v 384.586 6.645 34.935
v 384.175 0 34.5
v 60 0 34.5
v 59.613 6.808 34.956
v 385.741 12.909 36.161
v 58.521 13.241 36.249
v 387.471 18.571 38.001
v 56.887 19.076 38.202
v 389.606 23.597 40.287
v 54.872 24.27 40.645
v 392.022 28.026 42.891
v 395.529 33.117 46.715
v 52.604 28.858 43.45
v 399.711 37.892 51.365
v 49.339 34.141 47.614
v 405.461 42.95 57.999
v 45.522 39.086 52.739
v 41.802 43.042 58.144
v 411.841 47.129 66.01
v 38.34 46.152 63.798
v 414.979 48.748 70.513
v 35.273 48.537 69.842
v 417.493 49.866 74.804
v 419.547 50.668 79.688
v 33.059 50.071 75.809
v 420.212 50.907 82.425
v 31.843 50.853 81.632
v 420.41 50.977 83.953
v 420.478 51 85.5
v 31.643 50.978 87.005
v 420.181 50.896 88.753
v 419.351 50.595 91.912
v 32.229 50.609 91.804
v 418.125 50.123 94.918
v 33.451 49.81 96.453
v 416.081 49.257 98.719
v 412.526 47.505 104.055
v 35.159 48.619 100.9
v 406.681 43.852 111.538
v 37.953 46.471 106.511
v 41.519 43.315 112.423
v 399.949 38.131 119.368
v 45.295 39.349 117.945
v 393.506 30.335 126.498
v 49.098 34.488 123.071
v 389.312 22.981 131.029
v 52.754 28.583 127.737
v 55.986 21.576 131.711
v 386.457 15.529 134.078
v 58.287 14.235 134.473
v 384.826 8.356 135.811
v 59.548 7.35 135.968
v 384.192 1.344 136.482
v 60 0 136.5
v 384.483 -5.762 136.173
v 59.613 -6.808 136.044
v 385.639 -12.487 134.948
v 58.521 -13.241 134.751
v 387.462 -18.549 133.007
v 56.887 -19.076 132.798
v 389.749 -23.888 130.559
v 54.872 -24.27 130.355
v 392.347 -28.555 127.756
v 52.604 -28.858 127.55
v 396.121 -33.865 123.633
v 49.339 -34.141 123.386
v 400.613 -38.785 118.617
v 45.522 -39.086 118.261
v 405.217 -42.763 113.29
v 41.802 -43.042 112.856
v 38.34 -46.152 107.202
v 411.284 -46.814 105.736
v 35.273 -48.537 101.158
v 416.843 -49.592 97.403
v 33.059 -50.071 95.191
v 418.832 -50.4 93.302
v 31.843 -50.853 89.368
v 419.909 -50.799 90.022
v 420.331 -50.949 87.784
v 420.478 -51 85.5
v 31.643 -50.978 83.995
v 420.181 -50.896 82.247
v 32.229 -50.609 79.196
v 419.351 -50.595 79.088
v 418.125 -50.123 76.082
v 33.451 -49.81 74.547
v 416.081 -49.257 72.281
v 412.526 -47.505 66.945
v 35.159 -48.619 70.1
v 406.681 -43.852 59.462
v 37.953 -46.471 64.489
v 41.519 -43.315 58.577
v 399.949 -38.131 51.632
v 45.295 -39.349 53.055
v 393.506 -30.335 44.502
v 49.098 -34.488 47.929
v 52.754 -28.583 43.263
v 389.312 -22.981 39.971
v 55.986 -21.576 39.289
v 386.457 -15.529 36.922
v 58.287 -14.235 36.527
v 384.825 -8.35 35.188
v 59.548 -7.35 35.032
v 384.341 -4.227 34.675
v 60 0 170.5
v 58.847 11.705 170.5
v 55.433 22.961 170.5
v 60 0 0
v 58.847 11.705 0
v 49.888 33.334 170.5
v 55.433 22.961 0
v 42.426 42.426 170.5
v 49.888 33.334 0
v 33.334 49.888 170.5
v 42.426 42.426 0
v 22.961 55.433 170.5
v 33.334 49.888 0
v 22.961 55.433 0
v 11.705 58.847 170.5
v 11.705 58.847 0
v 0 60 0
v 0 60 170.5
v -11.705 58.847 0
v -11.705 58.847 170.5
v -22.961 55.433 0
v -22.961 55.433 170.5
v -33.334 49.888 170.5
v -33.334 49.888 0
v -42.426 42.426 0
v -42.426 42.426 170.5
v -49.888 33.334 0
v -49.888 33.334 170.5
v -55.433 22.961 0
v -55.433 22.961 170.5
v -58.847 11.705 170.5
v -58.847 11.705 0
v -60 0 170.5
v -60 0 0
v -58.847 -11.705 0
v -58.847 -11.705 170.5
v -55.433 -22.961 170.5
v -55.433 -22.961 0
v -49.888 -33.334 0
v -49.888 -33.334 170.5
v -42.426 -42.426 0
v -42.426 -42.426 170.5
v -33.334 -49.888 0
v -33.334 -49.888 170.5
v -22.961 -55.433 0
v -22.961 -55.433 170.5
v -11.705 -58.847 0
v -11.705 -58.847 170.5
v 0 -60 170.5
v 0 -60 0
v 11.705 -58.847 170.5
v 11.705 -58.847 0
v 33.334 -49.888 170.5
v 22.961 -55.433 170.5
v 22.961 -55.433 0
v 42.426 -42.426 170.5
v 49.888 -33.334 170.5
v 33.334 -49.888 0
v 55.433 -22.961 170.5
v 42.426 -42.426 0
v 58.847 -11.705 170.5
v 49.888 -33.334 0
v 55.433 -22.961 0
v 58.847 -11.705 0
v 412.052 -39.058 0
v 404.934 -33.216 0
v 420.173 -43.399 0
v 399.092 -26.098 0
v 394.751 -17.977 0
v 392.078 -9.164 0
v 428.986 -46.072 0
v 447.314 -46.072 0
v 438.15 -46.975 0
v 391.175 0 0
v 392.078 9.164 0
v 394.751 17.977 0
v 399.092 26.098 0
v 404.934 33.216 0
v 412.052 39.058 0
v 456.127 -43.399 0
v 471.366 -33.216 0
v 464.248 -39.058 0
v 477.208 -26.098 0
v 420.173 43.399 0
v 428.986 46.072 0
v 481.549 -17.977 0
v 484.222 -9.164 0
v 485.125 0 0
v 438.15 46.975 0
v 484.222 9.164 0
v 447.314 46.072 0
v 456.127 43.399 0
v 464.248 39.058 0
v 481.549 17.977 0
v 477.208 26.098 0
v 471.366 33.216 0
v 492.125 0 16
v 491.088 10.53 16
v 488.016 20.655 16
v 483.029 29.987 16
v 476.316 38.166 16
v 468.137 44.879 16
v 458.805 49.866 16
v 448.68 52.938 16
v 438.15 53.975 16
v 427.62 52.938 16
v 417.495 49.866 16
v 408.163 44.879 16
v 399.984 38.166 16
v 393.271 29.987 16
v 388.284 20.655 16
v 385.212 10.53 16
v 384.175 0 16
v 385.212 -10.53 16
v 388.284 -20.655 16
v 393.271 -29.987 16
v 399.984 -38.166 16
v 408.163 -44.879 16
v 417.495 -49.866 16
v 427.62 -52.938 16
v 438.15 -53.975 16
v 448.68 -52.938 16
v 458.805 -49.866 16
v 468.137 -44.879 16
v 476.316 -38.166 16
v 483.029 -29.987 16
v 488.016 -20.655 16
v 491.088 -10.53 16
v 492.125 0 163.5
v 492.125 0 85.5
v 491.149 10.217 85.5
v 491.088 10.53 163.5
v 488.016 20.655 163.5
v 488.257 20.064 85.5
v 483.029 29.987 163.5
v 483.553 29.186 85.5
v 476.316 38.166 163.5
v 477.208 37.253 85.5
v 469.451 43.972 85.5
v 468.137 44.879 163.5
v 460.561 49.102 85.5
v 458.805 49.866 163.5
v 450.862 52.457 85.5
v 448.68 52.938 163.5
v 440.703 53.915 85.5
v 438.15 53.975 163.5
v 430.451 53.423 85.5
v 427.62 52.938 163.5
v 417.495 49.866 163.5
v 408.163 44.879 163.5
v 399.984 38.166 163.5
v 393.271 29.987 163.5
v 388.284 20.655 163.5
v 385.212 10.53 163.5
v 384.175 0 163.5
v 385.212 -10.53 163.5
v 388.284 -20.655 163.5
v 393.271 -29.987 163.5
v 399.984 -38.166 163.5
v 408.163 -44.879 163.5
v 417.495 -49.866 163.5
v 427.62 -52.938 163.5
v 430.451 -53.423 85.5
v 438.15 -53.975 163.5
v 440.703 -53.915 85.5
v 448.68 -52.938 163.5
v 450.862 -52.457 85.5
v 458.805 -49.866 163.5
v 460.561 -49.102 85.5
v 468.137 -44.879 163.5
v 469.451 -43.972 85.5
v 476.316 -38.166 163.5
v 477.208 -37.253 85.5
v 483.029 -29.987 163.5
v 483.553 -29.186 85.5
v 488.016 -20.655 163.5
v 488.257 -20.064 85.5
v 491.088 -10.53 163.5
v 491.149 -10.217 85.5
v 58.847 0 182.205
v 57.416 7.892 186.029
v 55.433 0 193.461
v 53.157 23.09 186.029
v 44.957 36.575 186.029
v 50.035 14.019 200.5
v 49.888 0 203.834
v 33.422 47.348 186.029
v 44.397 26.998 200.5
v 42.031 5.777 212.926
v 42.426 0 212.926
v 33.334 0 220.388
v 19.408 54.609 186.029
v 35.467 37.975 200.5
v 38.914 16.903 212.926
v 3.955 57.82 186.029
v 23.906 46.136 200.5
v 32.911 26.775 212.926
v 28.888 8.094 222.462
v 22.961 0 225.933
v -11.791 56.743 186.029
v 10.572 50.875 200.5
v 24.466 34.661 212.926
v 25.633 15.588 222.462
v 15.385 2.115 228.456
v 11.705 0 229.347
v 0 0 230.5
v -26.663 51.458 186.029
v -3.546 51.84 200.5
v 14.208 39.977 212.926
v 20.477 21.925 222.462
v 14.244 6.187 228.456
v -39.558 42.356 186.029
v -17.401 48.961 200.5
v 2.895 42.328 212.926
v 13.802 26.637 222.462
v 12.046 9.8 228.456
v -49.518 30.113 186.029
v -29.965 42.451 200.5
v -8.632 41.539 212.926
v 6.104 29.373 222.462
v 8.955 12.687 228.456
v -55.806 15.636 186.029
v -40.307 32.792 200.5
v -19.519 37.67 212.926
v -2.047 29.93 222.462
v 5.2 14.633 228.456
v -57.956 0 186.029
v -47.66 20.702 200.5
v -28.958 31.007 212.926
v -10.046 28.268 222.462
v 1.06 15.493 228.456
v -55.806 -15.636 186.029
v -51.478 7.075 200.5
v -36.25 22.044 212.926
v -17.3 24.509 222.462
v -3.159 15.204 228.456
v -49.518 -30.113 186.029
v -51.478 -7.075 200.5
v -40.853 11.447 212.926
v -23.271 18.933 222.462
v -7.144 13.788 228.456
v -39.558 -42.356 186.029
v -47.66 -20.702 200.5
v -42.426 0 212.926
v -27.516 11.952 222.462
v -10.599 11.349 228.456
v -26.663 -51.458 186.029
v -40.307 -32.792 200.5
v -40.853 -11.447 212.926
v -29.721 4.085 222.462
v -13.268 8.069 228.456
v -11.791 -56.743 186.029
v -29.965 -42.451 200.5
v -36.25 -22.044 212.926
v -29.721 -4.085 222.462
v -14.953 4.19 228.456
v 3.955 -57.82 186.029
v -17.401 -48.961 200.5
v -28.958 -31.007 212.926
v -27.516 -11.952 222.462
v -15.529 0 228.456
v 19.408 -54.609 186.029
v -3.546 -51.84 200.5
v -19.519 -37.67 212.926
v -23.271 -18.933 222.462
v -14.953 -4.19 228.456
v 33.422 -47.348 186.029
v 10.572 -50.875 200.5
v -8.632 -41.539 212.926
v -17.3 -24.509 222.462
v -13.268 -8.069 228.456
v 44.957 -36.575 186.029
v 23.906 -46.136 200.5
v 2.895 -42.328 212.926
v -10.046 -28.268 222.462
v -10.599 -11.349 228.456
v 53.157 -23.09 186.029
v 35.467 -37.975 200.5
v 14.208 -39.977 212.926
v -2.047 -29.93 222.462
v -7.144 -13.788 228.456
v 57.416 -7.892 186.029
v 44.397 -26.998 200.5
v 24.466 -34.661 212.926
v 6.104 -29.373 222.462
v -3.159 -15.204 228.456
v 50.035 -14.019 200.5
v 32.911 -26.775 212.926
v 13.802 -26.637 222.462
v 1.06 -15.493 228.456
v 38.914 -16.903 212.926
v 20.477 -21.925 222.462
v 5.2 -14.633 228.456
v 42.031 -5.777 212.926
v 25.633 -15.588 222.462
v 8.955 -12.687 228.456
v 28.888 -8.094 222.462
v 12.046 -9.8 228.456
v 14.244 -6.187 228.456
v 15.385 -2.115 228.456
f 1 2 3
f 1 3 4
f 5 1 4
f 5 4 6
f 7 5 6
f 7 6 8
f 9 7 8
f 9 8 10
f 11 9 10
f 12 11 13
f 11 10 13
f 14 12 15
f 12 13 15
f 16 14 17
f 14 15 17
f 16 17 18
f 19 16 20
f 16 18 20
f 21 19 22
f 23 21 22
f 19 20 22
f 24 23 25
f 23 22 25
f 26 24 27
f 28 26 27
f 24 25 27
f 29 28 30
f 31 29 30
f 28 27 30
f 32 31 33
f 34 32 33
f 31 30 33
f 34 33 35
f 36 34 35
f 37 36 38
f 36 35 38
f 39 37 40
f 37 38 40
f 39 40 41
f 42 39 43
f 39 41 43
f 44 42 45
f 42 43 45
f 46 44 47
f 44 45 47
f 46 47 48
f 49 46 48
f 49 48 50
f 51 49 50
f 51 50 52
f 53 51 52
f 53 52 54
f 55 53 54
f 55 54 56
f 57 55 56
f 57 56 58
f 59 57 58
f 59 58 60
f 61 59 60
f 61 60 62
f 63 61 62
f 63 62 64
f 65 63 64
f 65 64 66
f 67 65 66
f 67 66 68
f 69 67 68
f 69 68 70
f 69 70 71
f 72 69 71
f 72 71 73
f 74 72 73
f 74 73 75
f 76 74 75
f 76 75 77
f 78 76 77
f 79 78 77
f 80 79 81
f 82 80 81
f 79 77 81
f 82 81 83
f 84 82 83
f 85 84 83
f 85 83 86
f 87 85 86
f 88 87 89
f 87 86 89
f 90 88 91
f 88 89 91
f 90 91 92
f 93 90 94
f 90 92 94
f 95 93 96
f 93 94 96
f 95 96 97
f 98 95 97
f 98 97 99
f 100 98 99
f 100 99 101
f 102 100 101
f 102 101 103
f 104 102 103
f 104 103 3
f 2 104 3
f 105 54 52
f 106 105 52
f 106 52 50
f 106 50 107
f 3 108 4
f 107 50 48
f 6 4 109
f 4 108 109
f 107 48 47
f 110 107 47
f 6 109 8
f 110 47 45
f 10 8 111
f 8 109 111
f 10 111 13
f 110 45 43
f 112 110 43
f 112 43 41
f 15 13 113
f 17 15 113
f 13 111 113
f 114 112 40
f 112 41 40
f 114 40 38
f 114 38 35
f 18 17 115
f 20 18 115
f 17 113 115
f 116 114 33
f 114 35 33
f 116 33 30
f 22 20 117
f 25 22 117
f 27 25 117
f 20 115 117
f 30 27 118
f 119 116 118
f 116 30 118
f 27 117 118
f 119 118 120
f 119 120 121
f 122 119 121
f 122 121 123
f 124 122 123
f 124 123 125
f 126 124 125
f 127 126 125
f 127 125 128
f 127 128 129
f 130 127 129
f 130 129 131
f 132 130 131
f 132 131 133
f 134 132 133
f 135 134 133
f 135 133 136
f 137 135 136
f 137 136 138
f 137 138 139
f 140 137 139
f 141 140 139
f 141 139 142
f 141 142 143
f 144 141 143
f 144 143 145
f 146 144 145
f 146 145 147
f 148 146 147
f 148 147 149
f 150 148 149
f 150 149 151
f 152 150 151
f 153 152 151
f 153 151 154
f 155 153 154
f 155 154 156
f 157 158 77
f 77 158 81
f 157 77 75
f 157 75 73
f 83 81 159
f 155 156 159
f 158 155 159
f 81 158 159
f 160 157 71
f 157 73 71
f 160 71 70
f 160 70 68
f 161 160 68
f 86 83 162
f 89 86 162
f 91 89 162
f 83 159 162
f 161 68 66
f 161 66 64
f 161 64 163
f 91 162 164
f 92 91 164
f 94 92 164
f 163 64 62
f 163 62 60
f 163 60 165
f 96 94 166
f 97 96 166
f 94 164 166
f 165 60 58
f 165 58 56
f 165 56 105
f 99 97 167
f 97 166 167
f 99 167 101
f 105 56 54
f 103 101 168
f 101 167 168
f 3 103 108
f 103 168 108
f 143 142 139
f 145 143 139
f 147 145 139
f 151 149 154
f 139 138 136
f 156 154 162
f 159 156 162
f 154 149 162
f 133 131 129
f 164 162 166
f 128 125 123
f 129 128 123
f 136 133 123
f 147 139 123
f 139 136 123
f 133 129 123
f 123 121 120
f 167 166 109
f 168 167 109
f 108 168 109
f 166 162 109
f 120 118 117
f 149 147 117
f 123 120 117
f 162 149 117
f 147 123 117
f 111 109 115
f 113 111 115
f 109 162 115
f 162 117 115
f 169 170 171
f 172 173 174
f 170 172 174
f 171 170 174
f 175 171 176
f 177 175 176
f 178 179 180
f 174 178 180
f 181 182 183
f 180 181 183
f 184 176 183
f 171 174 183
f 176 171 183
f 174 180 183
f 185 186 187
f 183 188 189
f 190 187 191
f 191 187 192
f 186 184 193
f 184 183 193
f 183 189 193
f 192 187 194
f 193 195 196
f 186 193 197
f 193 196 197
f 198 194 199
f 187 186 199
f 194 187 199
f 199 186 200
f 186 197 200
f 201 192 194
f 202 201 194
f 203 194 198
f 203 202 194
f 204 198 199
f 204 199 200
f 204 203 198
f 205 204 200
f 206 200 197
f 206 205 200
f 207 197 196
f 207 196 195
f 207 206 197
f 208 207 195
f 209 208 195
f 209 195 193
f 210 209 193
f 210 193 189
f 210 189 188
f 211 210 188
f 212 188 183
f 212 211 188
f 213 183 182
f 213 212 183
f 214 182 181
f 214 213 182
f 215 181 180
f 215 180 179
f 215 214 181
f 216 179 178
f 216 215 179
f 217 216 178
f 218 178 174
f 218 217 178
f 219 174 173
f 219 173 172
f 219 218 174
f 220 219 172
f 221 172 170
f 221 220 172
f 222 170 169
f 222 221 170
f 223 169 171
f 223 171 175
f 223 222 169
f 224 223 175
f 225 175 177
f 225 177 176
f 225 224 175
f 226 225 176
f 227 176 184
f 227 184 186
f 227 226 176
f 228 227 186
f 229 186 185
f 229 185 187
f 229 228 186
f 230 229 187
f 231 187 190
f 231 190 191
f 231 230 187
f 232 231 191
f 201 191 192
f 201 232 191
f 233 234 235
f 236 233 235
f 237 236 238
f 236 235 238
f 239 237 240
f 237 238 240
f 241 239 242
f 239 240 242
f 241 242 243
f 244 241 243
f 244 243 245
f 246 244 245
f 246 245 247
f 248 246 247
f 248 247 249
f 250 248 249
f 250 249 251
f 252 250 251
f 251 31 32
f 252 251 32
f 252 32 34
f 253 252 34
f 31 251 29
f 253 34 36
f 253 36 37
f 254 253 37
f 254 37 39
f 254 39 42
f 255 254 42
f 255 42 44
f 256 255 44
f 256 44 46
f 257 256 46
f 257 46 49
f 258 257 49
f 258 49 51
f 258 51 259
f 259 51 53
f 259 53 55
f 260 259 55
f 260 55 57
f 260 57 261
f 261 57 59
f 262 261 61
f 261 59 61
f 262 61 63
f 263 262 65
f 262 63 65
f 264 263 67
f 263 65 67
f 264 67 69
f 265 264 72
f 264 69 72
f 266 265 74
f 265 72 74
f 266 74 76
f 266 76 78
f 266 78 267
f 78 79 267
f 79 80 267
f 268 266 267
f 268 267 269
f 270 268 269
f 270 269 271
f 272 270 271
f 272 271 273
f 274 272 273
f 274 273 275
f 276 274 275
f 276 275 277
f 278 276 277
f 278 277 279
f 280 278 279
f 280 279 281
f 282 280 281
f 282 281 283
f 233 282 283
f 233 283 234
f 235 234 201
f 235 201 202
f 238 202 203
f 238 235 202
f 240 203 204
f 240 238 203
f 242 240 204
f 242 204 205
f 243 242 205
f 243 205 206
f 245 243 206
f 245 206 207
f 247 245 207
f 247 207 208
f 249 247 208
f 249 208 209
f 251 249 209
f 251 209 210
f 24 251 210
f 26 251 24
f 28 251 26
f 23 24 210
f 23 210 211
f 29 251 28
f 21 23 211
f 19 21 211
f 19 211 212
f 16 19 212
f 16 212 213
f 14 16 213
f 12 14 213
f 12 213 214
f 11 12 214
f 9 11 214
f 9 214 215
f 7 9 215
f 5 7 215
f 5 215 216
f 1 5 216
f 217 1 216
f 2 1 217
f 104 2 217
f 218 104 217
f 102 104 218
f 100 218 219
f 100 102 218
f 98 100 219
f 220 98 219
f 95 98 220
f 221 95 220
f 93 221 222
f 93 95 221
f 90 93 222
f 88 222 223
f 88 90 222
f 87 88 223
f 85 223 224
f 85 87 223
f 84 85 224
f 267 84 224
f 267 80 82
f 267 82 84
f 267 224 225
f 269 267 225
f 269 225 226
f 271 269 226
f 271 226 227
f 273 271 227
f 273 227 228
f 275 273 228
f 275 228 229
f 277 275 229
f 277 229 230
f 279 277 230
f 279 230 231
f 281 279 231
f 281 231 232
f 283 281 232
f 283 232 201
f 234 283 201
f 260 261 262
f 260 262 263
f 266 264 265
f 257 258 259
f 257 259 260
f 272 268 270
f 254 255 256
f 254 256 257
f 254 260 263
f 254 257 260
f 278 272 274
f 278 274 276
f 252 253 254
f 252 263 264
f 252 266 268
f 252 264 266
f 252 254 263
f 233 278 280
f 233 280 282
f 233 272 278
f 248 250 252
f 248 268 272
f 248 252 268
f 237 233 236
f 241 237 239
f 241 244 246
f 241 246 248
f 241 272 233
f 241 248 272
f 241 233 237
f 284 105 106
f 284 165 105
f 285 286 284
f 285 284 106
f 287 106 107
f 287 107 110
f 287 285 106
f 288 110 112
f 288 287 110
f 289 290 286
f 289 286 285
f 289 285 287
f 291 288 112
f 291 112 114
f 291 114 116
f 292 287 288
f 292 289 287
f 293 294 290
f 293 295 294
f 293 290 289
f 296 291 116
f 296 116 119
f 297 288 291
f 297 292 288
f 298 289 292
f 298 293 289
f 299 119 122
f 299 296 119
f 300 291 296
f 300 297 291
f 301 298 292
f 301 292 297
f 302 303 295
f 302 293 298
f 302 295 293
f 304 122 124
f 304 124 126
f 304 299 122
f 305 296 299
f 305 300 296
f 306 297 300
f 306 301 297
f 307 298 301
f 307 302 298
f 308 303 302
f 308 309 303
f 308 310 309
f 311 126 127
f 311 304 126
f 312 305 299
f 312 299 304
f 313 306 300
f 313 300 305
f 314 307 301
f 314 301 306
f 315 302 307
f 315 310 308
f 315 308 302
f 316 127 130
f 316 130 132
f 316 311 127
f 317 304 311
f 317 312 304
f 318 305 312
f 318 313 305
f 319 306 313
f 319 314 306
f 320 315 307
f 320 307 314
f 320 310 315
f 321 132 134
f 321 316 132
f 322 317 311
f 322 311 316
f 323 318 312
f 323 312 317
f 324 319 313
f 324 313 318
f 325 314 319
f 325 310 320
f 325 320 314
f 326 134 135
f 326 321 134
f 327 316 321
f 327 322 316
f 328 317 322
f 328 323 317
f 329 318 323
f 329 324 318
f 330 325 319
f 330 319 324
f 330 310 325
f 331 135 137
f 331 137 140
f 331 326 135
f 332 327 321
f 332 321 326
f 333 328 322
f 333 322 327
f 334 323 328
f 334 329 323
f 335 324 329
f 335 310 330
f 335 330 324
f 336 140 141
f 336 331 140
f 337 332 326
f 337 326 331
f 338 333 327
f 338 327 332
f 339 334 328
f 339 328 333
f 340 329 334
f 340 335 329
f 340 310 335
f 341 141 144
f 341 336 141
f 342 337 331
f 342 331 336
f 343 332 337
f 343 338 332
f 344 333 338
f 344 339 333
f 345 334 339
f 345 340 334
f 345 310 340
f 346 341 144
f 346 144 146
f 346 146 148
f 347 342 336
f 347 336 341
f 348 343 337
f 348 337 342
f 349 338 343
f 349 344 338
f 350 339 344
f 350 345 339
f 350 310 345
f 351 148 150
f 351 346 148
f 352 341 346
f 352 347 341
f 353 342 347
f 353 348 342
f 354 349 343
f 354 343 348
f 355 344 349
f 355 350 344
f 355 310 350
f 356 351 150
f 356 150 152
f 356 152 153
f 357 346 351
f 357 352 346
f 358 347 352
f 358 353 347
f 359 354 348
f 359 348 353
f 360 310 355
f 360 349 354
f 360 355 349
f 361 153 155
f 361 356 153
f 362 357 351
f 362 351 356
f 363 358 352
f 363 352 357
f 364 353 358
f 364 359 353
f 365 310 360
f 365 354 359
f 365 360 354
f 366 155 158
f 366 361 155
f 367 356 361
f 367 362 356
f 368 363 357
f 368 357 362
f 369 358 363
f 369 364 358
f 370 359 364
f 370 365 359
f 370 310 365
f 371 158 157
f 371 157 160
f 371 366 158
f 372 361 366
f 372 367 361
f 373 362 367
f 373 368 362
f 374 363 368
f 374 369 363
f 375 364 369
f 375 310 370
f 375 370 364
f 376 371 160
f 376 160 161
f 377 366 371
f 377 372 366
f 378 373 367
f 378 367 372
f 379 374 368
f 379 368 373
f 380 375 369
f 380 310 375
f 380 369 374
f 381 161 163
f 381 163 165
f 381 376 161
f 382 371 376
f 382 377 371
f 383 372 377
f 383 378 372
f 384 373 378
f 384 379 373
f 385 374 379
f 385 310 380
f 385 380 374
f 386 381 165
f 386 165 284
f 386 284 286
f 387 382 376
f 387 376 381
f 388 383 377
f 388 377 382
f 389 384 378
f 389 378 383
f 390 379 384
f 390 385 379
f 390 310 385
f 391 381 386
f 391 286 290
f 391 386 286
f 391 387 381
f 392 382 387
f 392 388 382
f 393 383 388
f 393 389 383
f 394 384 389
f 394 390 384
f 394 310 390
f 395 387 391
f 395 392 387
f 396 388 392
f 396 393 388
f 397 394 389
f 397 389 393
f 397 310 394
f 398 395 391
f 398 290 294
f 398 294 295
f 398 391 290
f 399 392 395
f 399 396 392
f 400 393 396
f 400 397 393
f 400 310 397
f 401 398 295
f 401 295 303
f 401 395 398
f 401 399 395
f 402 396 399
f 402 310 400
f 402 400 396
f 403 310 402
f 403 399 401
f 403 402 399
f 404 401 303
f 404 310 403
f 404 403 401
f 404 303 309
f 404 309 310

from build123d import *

# Parameters (mm, degrees)
SKETCH1_R                = 60
BOSS_EXTRUDE1_DEPTH      = 230.5
FILLET1_R                = 60
SKETCH2_R                = 51
BOSS_EXTRUDE2_DEPTH      = 438.15
BOSS_EXTRUDE3_DEPTH      = 78
BOSS_EXTRUDE3_DEPTH_BACK = 85.5
SKETCH3_R                = 53.975
CHAMFER1_SIZE            = 7
CHAMFER1_SIZE2           = 16


with BuildPart() as part:
    # Sketch1 → Boss-Extrude1 (new body)
    with BuildSketch(Plane.XY):
        Circle(SKETCH1_R)
    extrude(amount=BOSS_EXTRUDE1_DEPTH)

    # Fillet1
    fillet1_edges = [part.edges().sort_by_distance(p)[0] for p in [
        (-60, 0, 230.5),
    ]]
    fillet(fillet1_edges, radius=FILLET1_R)

    # Sketch2 → Boss-Extrude2 (add)
    with BuildSketch(Plane(origin=(0, 0, 0), x_dir=(0, 0, -1), z_dir=(1, 0, 0))):
        with Locations((-85.5, 0)):
            Circle(SKETCH2_R)
    extrude(amount=BOSS_EXTRUDE2_DEPTH)

    # Sketch3 → Boss-Extrude3 (add, two sides: drawn at the far end of the back side and taken through both)
    with BuildSketch(Plane.XY.offset(85.5).offset(-BOSS_EXTRUDE3_DEPTH_BACK)):
        with Locations((438.15, 0)):
            Circle(SKETCH3_R)
    extrude(amount=BOSS_EXTRUDE3_DEPTH + BOSS_EXTRUDE3_DEPTH_BACK)

    # Chamfer1
    chamfer1_edges = [part.edges().sort_by_distance(p)[0] for p in [
        (384.175, 0, 0),
    ]]
    chamfer1_side = [part.faces().sort_by_distance(p)[0] for p in [
        (438.15, 0, 0),
    ]]
    chamfer(chamfer1_edges, length=CHAMFER1_SIZE, length2=CHAMFER1_SIZE2, reference=chamfer1_side[0])


solid = part.part
